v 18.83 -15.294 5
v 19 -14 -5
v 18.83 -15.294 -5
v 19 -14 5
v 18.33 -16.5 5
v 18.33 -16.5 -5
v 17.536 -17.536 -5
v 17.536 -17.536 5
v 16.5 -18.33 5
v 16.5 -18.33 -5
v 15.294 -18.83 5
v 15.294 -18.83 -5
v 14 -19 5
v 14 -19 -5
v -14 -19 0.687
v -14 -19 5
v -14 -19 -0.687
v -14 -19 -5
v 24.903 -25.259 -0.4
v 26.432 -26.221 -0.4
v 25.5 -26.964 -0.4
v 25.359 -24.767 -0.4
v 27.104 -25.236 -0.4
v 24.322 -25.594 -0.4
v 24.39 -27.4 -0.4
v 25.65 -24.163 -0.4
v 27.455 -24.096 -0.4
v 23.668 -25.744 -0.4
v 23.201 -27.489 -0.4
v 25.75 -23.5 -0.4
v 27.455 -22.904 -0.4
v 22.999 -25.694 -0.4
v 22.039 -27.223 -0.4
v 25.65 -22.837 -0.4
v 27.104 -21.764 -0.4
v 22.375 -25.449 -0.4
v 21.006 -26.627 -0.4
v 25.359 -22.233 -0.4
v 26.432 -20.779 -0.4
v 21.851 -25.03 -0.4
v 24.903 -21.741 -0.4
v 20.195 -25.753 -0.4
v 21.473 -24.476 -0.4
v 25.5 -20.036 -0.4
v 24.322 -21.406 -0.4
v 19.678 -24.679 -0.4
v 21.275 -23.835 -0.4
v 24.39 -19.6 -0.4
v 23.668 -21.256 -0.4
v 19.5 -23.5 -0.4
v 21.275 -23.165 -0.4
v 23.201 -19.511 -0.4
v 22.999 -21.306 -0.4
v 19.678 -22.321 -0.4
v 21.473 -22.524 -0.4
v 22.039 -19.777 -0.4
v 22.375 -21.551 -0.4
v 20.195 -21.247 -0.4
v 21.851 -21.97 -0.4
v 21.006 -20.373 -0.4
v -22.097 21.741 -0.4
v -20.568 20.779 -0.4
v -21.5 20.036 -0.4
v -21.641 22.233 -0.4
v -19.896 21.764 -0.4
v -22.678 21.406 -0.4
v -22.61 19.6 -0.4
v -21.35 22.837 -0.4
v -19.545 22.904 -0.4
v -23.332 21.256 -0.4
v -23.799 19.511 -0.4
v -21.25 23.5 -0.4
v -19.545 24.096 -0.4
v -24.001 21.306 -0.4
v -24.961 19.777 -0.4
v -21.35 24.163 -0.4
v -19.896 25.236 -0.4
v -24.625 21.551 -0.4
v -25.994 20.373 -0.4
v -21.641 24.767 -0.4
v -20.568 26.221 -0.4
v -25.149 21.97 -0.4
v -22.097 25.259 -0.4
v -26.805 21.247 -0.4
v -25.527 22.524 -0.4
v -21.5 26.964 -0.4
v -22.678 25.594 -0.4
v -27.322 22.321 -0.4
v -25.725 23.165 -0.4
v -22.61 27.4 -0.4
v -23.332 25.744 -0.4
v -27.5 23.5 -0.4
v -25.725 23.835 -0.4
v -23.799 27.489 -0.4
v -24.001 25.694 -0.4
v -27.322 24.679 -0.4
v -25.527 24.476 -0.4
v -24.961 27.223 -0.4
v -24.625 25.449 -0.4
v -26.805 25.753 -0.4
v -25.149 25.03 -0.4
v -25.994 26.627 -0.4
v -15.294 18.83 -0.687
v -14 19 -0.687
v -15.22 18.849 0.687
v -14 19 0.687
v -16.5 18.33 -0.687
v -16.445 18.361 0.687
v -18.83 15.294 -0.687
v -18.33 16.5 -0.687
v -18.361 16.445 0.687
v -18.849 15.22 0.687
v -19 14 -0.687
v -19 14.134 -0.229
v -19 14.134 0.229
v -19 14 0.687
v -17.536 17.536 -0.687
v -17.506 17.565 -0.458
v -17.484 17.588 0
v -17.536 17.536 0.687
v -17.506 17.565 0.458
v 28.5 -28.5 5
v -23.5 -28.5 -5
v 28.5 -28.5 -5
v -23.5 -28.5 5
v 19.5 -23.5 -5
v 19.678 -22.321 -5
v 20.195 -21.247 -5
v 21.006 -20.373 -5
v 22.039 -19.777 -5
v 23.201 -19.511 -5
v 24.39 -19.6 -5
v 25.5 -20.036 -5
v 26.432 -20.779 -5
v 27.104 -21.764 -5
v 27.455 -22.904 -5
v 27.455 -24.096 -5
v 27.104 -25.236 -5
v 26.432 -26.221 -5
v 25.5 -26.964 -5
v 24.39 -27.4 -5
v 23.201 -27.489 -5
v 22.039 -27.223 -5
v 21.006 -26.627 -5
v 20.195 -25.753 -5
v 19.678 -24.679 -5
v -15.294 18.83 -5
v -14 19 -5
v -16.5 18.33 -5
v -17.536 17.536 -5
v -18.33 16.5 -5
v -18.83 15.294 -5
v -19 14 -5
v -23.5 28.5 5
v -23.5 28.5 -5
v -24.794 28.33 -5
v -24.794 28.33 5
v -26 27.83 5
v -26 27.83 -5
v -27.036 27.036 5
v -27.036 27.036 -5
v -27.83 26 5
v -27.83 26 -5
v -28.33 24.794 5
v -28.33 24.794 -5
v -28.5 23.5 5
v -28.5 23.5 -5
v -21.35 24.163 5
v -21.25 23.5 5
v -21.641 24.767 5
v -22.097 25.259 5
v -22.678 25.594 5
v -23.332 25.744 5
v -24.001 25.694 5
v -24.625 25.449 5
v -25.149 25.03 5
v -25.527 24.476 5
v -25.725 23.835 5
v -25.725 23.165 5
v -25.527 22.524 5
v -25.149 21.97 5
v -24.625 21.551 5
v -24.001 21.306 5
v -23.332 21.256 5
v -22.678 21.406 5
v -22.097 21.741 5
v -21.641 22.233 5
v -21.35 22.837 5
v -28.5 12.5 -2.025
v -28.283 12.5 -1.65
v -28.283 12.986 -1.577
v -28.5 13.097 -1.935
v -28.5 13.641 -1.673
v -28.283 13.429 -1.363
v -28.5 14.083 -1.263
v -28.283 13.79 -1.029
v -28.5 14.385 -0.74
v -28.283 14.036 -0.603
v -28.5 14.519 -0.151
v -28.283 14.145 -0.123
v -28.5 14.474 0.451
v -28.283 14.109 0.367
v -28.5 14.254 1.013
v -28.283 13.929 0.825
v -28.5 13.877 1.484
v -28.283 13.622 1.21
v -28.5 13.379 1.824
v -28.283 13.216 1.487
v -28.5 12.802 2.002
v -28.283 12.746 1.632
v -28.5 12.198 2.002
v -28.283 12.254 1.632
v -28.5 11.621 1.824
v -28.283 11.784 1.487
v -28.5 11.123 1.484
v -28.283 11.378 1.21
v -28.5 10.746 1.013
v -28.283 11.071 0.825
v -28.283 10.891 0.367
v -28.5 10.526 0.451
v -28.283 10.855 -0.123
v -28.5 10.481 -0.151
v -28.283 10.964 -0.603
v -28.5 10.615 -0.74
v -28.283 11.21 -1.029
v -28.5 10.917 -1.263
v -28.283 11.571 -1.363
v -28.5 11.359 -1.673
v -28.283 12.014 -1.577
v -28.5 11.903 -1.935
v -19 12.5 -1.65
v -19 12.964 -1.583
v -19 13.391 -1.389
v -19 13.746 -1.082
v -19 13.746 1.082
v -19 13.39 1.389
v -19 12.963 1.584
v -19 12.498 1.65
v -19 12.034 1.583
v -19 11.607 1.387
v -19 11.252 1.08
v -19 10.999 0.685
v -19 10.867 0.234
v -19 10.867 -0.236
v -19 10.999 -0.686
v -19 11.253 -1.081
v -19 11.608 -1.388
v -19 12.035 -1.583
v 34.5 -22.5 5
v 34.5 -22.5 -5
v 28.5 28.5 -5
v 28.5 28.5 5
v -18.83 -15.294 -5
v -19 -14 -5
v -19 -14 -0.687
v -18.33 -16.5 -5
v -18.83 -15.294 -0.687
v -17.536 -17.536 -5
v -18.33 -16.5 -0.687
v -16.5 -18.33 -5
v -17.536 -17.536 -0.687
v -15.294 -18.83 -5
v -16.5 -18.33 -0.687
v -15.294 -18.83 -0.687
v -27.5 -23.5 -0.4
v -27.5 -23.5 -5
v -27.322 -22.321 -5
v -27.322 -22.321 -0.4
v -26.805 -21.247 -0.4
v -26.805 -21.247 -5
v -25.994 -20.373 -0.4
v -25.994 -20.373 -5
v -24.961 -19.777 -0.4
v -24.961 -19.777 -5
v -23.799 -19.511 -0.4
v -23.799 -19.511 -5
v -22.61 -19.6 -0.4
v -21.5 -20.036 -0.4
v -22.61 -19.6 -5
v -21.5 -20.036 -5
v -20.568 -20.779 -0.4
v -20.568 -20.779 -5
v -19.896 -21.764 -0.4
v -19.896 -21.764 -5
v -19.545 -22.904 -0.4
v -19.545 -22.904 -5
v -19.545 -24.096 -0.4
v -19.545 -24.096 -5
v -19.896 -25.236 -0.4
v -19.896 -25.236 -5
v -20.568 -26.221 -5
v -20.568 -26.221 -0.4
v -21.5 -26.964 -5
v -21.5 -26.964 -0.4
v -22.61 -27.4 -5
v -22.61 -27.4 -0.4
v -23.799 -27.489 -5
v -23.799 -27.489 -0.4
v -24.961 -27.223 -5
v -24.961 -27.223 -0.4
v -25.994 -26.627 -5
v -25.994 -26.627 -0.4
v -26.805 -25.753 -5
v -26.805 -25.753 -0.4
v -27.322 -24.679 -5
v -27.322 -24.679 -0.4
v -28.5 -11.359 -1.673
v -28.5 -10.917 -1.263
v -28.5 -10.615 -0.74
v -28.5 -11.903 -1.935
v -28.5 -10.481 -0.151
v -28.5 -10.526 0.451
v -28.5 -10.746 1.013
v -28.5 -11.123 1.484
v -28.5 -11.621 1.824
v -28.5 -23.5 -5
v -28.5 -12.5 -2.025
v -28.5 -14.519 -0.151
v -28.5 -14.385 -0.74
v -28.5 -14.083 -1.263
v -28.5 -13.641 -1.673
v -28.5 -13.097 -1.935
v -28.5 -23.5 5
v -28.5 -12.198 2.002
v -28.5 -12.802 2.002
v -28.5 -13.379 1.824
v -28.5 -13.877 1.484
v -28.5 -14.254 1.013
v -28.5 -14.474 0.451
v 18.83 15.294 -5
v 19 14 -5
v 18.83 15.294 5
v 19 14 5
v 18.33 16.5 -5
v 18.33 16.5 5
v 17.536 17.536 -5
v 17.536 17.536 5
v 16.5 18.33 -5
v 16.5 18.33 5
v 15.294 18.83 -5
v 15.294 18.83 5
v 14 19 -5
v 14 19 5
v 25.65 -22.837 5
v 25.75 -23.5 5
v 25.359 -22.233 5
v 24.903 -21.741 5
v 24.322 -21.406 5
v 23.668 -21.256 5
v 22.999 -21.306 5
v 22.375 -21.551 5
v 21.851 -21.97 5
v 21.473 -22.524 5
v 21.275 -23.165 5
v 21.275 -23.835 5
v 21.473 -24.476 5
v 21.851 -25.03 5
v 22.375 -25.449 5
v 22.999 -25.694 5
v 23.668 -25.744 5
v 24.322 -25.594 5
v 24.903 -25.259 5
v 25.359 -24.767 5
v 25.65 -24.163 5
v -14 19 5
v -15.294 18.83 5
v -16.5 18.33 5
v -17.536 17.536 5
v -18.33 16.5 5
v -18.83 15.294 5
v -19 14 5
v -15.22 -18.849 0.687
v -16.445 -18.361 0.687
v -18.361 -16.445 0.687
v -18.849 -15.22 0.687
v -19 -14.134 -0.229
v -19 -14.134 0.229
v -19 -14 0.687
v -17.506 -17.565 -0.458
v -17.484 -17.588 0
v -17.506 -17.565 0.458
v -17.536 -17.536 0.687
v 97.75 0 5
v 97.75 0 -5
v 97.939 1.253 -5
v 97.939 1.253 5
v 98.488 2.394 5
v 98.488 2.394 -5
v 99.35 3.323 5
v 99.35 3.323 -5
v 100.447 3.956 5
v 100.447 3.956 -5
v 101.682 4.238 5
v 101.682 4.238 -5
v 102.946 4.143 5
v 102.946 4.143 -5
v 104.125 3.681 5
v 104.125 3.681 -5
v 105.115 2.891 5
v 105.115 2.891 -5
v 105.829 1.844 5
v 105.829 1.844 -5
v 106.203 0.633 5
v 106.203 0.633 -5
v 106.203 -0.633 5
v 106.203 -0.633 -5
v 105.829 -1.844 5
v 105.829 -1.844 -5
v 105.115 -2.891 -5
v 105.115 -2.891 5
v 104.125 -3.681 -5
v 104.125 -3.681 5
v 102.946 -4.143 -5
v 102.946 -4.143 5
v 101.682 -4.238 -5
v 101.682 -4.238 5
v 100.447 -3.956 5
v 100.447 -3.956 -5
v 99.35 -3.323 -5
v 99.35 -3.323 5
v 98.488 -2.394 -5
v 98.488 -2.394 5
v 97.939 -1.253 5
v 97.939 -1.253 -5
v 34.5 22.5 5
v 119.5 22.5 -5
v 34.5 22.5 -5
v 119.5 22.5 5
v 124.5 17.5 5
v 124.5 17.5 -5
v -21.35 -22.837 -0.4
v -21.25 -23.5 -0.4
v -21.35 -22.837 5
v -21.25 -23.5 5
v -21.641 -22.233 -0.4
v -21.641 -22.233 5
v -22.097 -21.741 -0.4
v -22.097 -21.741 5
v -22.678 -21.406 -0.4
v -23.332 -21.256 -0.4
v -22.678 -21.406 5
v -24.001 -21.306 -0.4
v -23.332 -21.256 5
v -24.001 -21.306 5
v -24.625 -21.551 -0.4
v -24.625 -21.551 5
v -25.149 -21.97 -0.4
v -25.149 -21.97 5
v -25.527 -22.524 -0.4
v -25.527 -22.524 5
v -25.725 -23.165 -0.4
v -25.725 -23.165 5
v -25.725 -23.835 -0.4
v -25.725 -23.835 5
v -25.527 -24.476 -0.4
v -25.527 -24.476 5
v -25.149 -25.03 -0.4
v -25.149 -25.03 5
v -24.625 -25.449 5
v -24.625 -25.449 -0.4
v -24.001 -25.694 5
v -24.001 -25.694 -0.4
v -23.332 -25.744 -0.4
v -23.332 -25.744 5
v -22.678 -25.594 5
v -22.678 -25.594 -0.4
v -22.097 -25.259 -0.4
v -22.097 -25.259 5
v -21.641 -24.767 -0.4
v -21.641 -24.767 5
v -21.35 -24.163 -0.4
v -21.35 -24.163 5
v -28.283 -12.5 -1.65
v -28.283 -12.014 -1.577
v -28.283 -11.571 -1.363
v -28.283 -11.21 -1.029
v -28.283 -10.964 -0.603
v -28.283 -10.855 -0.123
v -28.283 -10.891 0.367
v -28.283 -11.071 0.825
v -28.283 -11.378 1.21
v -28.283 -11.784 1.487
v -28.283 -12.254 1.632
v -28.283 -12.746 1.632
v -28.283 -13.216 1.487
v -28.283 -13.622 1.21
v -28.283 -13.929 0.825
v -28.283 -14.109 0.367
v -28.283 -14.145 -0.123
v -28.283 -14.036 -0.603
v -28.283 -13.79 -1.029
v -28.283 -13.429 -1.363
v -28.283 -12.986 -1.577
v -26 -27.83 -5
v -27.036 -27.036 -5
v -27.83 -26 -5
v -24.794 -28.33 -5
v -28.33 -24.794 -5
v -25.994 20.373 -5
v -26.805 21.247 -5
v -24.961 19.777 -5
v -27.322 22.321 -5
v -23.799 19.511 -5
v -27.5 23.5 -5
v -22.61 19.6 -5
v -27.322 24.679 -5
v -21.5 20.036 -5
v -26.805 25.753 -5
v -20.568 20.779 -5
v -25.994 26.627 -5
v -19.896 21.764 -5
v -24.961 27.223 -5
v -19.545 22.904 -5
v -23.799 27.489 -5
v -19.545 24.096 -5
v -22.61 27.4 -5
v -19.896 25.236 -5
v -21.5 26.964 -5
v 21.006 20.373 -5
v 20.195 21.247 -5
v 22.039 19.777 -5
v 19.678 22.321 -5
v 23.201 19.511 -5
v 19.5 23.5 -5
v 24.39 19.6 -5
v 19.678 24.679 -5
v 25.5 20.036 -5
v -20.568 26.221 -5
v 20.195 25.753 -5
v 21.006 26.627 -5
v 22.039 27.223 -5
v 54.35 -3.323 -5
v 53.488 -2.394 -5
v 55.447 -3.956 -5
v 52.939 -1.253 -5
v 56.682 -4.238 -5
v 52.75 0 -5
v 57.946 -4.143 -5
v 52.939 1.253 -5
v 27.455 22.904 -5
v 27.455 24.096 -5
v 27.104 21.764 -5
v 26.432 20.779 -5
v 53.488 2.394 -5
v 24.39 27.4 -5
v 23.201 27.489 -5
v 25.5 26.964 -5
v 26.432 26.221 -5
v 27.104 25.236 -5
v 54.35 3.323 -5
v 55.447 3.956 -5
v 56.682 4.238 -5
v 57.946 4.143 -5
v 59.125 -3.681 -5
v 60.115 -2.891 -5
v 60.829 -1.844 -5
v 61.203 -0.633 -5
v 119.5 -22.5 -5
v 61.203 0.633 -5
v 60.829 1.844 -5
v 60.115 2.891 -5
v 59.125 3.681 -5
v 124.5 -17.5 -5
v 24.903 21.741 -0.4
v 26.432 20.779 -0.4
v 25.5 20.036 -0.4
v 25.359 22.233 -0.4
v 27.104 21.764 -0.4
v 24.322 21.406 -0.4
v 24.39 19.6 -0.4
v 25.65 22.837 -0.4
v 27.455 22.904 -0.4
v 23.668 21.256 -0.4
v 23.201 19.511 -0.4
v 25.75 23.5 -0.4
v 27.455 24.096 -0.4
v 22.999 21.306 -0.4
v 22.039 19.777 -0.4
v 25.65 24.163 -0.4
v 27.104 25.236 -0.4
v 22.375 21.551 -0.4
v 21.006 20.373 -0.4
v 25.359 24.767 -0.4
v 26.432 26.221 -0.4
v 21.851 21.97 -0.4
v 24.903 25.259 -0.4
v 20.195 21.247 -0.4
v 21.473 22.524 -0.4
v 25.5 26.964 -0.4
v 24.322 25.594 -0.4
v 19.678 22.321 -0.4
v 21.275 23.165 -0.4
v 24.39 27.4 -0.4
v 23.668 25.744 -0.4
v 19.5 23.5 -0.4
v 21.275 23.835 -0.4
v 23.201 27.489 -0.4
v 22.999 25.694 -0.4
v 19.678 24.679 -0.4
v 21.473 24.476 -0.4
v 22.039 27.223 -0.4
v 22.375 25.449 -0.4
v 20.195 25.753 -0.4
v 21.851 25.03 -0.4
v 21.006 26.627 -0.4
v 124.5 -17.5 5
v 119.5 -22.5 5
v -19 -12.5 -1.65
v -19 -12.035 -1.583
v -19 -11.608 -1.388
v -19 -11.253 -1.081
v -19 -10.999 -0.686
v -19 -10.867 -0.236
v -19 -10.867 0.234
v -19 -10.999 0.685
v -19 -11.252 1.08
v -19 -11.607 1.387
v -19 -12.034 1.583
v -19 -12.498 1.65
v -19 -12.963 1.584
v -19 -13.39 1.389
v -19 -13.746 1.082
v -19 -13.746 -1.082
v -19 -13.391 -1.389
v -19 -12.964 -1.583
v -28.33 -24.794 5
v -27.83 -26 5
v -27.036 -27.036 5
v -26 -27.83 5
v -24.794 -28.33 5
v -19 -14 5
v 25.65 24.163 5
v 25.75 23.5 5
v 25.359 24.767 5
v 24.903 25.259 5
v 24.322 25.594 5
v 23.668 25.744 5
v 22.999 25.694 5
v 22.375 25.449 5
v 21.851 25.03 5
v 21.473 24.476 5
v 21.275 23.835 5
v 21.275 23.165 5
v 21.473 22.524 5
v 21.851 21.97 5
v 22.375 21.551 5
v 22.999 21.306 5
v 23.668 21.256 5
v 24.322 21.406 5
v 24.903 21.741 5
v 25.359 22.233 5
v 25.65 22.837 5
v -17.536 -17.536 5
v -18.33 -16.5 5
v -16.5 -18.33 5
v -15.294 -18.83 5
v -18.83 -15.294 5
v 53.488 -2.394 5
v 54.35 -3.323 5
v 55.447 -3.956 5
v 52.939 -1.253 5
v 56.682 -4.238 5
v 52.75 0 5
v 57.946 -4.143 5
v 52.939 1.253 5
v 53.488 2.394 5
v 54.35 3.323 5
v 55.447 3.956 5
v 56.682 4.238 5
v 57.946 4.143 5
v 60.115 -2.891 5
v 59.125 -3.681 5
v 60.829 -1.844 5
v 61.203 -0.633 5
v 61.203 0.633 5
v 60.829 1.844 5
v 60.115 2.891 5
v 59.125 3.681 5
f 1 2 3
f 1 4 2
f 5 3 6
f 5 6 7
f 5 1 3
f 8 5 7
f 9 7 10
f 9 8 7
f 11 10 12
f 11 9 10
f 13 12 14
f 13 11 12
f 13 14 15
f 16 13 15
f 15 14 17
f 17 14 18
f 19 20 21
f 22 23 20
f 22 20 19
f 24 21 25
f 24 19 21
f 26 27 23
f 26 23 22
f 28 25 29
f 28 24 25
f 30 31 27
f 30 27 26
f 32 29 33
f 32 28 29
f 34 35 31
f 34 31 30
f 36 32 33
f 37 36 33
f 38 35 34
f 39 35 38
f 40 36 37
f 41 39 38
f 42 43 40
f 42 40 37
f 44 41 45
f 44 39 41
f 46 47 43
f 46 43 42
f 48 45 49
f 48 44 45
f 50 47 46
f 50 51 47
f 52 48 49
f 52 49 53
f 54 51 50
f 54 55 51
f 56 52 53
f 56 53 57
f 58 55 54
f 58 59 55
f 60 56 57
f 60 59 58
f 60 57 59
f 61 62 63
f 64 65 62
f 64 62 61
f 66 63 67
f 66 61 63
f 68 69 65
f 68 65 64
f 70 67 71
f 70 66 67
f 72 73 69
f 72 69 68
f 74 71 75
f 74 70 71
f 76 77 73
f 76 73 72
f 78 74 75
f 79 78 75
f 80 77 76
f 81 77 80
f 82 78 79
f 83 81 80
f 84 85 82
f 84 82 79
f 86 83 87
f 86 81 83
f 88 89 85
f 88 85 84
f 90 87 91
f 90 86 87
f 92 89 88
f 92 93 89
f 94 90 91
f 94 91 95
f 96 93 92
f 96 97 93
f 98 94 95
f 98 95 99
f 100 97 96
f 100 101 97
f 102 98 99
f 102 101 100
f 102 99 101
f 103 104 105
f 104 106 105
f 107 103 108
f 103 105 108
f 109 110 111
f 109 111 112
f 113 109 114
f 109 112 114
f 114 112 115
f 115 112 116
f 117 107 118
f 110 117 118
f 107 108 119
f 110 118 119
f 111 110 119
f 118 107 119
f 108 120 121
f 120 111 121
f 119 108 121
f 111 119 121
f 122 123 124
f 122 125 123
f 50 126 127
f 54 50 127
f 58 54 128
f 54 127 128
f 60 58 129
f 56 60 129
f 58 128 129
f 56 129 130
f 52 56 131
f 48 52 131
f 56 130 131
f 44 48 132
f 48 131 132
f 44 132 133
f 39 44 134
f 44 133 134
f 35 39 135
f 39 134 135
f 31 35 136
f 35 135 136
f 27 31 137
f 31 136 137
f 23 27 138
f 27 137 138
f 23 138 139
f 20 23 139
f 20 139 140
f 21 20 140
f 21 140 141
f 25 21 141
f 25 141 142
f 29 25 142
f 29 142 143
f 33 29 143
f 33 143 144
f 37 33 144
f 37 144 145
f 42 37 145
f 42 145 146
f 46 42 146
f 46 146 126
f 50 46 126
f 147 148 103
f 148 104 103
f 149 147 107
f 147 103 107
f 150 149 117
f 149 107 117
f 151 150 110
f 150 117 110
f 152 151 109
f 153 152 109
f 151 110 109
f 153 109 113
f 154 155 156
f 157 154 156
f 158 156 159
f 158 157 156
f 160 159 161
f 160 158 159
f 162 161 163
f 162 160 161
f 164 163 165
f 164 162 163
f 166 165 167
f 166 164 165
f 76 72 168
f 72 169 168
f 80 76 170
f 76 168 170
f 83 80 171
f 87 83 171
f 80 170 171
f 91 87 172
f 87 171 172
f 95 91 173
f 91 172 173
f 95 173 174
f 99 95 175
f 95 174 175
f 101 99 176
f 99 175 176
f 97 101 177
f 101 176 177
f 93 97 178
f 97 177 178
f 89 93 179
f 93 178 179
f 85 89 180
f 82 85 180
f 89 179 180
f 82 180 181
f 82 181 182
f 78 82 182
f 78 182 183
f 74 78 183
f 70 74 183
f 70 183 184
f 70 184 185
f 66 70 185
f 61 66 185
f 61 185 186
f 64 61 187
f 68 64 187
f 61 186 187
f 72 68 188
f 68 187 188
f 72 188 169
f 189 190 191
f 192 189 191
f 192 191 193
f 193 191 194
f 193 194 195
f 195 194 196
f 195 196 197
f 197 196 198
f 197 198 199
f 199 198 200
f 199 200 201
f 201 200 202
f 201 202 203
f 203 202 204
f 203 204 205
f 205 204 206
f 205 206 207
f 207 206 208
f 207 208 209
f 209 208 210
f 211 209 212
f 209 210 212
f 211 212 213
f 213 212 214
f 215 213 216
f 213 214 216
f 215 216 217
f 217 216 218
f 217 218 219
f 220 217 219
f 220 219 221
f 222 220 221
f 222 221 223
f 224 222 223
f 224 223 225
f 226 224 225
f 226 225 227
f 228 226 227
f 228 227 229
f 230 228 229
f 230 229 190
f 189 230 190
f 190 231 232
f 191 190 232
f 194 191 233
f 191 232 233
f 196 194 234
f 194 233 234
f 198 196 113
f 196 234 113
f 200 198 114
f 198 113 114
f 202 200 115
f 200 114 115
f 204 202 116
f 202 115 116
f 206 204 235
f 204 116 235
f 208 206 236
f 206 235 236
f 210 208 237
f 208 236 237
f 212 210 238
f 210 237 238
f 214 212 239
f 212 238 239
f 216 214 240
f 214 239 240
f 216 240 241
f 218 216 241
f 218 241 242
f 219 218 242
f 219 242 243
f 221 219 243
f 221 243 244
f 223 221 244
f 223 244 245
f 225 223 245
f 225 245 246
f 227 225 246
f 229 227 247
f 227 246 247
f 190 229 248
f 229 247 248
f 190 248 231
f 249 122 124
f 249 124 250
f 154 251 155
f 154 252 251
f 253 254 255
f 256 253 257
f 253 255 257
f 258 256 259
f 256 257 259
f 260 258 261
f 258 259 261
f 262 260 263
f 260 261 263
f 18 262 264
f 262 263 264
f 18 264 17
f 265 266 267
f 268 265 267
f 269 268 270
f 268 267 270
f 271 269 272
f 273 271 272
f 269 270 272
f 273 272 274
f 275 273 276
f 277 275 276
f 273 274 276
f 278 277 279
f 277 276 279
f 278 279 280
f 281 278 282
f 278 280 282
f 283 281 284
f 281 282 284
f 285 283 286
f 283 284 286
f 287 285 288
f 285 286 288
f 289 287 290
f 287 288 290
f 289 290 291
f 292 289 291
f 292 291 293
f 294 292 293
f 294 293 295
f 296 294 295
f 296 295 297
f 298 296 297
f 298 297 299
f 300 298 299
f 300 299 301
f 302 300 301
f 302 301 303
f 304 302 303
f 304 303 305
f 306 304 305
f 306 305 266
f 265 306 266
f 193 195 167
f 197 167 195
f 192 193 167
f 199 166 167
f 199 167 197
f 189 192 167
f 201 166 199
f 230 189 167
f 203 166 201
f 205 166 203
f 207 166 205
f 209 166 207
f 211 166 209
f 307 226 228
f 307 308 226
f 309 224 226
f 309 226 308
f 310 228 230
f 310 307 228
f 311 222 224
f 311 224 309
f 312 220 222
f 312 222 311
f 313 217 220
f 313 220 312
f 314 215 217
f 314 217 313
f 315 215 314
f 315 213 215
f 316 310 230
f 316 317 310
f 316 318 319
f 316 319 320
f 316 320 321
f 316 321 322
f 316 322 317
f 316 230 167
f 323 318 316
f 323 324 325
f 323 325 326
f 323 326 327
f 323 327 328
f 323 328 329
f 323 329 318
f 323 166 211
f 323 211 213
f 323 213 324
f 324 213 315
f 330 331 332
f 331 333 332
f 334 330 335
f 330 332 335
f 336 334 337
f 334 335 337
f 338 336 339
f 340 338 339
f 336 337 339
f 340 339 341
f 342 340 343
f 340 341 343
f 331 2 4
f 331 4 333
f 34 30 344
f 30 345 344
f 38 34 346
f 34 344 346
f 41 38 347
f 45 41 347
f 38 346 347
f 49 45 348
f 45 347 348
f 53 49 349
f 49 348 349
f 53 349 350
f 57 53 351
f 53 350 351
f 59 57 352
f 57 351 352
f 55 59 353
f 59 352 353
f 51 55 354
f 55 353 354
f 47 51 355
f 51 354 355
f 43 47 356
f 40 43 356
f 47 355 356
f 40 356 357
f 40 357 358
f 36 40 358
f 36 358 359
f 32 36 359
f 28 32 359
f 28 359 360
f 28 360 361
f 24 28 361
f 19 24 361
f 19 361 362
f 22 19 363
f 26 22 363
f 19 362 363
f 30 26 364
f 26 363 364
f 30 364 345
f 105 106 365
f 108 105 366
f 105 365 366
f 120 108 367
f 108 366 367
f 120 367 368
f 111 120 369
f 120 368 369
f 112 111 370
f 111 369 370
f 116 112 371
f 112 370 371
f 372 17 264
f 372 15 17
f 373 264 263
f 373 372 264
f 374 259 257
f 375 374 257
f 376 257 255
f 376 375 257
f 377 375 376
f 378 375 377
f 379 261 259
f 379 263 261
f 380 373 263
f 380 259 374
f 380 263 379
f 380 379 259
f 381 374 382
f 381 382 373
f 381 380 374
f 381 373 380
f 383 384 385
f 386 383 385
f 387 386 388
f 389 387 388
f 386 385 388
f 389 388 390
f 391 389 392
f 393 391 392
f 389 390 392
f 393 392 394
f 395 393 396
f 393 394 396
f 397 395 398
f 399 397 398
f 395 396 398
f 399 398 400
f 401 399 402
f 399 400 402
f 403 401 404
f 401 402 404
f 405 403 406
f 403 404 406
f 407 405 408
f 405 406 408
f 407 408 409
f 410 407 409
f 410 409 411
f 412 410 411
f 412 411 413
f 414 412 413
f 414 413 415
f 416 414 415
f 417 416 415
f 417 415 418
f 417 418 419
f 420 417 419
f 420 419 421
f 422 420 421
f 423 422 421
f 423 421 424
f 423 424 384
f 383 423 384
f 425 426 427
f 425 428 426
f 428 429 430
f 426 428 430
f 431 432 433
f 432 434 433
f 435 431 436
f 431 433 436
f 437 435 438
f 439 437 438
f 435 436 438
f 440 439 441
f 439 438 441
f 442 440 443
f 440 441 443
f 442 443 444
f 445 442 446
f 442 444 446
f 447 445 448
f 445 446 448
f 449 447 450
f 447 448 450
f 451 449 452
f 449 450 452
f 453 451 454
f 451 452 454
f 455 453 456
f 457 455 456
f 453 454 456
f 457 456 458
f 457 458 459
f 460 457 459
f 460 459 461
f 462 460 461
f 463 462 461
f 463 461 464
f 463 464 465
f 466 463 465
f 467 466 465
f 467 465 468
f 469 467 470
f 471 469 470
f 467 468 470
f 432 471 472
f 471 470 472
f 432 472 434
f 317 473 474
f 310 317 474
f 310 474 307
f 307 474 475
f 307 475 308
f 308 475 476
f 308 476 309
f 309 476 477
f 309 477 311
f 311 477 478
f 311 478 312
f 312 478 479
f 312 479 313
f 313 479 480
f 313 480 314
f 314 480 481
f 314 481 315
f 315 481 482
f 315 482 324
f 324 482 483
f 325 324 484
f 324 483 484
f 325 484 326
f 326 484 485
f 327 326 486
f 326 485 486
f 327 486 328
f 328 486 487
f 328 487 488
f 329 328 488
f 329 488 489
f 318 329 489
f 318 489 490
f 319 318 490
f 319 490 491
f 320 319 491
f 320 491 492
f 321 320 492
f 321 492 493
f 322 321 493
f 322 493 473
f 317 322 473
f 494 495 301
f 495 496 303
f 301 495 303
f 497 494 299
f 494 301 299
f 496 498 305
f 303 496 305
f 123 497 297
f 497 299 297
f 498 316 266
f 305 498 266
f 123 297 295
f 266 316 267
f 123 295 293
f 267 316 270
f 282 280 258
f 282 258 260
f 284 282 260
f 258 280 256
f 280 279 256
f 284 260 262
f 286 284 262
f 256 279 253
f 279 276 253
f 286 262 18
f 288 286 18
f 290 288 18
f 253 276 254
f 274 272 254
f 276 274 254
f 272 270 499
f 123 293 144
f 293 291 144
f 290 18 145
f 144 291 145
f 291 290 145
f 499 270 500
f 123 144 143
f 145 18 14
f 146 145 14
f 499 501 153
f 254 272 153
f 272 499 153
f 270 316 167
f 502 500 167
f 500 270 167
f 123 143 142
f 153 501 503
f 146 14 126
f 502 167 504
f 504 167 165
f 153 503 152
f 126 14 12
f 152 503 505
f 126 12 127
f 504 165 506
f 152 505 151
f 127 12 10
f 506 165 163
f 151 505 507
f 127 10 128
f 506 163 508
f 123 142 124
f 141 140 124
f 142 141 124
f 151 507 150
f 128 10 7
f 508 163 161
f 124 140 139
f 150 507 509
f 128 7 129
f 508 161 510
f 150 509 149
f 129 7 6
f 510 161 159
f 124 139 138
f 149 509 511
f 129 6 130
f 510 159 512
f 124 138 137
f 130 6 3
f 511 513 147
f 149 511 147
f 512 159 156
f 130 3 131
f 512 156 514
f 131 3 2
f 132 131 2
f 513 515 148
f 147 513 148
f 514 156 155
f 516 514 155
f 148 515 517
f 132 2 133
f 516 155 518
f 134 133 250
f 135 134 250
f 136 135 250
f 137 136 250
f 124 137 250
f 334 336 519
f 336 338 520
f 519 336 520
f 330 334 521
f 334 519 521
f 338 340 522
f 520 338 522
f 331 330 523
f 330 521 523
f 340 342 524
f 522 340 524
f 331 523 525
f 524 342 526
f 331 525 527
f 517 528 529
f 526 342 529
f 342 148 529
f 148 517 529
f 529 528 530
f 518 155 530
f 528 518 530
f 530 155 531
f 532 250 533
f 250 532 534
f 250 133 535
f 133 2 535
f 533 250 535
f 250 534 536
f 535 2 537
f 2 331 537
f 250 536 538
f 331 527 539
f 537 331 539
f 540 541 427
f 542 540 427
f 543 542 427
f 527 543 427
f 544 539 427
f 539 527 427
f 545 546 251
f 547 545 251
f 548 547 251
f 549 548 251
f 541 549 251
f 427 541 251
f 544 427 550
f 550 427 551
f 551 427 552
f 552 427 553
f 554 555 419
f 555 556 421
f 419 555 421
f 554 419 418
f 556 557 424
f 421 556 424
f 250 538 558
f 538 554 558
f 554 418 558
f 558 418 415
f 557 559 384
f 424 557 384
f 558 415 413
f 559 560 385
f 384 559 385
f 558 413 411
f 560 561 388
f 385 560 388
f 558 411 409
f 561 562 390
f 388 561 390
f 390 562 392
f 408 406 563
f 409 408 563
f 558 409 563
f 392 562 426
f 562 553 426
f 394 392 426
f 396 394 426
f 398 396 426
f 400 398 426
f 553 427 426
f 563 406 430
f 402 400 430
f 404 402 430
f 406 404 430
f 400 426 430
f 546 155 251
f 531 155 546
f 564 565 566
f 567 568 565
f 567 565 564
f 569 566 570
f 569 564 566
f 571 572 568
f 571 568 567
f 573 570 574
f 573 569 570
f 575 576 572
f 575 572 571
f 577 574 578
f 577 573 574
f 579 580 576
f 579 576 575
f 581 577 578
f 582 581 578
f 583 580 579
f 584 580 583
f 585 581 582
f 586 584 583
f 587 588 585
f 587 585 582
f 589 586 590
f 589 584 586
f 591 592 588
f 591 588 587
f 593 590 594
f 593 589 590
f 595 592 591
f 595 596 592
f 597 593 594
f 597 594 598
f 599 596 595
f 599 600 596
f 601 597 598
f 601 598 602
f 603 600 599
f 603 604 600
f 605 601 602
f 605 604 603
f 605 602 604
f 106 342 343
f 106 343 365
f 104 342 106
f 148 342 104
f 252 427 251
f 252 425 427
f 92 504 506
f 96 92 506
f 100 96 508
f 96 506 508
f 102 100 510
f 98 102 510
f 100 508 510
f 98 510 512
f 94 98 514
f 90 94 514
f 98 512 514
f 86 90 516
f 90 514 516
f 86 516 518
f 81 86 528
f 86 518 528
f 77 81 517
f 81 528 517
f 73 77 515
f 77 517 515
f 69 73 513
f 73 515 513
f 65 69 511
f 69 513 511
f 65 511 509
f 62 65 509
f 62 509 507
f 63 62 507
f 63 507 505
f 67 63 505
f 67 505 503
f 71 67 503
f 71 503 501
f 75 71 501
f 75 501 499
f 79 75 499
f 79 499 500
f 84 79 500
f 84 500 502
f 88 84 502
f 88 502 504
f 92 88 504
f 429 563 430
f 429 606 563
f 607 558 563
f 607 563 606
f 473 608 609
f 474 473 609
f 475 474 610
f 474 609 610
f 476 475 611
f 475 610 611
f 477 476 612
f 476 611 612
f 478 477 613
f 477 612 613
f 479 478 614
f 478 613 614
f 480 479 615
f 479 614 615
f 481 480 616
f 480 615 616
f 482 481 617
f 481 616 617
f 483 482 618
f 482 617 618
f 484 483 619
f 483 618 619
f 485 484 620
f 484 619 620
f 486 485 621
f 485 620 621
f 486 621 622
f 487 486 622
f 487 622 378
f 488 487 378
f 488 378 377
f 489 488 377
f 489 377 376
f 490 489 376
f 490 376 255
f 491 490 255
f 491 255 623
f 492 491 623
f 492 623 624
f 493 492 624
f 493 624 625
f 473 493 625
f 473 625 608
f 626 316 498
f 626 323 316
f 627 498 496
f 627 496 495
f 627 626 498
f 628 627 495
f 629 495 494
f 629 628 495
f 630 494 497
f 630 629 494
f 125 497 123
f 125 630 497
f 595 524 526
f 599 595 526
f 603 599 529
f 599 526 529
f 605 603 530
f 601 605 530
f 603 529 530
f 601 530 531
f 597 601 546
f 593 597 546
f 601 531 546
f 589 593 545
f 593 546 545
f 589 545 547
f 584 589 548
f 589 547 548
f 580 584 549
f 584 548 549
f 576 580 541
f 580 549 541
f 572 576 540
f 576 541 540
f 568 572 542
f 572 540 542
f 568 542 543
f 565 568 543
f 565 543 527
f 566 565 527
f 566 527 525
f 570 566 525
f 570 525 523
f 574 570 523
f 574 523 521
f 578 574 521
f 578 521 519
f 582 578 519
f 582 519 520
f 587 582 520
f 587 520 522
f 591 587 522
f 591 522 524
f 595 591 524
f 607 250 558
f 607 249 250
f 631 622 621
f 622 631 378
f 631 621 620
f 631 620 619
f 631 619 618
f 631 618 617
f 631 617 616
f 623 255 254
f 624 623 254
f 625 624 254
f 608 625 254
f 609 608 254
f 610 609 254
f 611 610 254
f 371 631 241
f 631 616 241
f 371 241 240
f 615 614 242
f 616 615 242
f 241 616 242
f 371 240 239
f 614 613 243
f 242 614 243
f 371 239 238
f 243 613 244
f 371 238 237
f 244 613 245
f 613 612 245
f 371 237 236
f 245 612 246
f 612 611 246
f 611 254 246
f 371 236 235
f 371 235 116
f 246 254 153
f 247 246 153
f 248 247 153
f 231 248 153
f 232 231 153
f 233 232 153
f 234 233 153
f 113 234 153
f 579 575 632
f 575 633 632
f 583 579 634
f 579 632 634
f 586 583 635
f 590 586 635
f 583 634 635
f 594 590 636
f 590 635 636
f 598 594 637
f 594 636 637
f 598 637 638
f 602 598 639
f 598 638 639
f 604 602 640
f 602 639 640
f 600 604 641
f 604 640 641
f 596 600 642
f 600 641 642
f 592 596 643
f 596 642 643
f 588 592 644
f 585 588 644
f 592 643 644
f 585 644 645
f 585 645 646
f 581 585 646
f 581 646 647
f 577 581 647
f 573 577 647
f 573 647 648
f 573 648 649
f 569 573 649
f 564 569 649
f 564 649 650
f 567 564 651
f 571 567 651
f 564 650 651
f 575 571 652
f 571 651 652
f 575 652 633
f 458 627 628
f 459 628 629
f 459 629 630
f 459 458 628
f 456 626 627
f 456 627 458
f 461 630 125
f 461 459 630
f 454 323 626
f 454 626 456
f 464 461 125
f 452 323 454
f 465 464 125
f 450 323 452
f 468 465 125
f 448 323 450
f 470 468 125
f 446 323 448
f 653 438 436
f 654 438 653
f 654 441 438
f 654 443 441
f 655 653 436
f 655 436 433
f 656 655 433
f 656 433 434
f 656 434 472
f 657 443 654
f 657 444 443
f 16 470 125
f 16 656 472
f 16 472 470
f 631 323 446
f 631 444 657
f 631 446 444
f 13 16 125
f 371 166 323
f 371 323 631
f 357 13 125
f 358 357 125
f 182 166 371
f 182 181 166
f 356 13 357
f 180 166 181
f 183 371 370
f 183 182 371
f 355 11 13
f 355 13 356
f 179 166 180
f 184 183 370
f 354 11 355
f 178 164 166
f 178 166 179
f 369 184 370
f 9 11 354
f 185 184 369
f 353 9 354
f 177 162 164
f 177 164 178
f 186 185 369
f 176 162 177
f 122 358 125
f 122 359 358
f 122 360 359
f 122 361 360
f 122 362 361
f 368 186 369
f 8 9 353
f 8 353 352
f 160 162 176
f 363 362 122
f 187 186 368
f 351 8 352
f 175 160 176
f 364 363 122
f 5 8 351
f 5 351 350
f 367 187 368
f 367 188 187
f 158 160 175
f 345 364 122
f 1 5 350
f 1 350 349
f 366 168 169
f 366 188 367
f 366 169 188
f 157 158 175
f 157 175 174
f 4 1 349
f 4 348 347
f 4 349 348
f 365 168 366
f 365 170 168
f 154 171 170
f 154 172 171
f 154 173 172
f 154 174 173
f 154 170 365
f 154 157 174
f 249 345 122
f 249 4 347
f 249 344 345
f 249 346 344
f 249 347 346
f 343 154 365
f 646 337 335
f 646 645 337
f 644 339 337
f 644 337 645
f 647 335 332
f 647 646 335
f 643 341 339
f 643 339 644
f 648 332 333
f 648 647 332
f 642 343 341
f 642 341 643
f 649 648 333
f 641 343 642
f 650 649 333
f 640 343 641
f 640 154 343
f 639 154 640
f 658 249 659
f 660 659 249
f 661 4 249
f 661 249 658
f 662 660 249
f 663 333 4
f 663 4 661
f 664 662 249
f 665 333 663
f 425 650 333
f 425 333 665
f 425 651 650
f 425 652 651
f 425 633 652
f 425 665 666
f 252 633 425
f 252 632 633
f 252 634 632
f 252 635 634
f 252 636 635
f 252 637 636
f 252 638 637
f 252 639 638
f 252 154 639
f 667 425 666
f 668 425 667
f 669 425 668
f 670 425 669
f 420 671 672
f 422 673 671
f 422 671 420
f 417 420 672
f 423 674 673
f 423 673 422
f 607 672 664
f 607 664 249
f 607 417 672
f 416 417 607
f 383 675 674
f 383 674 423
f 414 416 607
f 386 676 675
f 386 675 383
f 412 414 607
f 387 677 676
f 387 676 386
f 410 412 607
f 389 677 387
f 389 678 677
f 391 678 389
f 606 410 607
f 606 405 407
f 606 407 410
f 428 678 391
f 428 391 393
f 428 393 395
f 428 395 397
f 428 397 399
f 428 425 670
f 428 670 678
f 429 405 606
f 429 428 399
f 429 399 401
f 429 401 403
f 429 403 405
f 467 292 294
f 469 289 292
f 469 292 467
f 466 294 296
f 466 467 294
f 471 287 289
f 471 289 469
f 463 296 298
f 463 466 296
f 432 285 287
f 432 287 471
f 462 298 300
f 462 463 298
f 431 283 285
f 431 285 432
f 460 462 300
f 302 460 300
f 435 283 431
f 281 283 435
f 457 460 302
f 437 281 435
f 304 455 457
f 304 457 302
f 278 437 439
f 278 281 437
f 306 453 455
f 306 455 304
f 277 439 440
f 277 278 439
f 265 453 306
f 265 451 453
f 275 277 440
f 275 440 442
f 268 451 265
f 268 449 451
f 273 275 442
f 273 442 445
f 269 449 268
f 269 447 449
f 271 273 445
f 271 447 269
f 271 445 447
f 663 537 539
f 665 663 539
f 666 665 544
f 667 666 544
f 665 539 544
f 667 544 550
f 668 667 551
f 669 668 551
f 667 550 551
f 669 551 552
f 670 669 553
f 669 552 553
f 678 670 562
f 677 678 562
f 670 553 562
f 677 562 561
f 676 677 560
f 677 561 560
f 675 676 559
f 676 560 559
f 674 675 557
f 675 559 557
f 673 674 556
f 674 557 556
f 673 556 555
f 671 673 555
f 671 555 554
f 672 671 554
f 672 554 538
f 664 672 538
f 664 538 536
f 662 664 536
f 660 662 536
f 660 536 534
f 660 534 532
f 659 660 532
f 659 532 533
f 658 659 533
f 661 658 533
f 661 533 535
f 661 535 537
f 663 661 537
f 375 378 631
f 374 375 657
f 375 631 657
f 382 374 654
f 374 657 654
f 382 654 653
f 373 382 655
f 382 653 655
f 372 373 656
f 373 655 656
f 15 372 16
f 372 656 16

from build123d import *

# Parameters (mm, degrees)
EXTRUDE_1_DEPTH              = 5
SKETCH_6_R                   = 10
CUT_EXTRUDE_1530_DEPTH       = 10
SKETCH_19_R                  = 12
CUT_EXTRUDE_1946_DEPTH       = 5
HOLE_WIZARD_8_5_8_5_1_D      = 8.5
HOLE_WIZARD_1_D              = 4.5
HOLE_WIZARD_1_CBORE_D        = 8
HOLE_WIZARD_1_CBORE_DEPTH    = 4.6
FILLET_1_R                   = 5
CHAMFER_1_SIZE               = 5
CHAMFER_2_SIZE               = 0.2
HOLE_WIZARD_M4_1_D           = 3.3
HOLE_WIZARD_M4_1_DEPTH       = 15.5
HOLE_WIZARD_M4_1_CSINK_D     = 4.05
HOLE_WIZARD_M4_1_CSINK_ANGLE = 120
SKETCH_22_W                  = 38
SKETCH_22_H                  = 38
CUT_EXTRUDE_1_DEPTH          = 10
FILLET_2_R                   = 5


with BuildPart() as part:
    # 草图1 → 凸台-拉伸1 (new body, symmetric)
    with BuildSketch(Plane.XY):
        Polygon((28.5, 28.5), (-28.5, 28.5), (-28.5, -28.5), (28.5, -28.5), (34.5, -22.5), (124.5, -22.5), (124.5, 22.5), (34.5, 22.5), align=None)
    extrude(amount=EXTRUDE_1_DEPTH, both=True)

    # 草图6 → Cut-Extrude 1530 (cut)
    with BuildSketch(Plane.XY.offset(5)):
        Circle(SKETCH_6_R)
    extrude(amount=-CUT_EXTRUDE_1530_DEPTH, mode=Mode.SUBTRACT)

    # 草图19 → Cut-Extrude 1946 (cut)
    with BuildSketch(Plane(origin=(0, 0, -5), x_dir=(-1, 0, 0), z_dir=(0, 0, -1))):
        Circle(SKETCH_19_R)
    extrude(amount=-CUT_EXTRUDE_1946_DEPTH, mode=Mode.SUBTRACT)

    # Ø8.5 (8.5) 直径孔1 (through all)
    with Locations(Plane.XY.offset(5)):
        with Locations((57, 0), (102, 0)):
            Hole(HOLE_WIZARD_8_5_8_5_1_D / 2)

    # 打孔尺寸(%根据)内六角圆柱头螺钉的类型1 (through all)
    with Locations(Plane(origin=(0, 0, -5), x_dir=(-1, 0, 0), z_dir=(0, 0, -1))):
        with Locations((-23.5, 23.5), (23.5, 23.5), (23.5, -23.5), (-23.5, -23.5)):
            CounterBoreHole(HOLE_WIZARD_1_D / 2, HOLE_WIZARD_1_CBORE_D / 2, HOLE_WIZARD_1_CBORE_DEPTH)

    # 圆角1
    fillet_1_edges = [part.edges().sort_by_distance(p)[0] for p in [
        (-28.5, -28.5, 0),
        (-28.5, 28.5, 0),
    ]]
    fillet(fillet_1_edges, radius=FILLET_1_R)

    # 倒角1
    chamfer_1_edges = [part.edges().sort_by_distance(p)[0] for p in [
        (124.5, 22.5, 0),
        (124.5, -22.5, 0),
    ]]
    chamfer(chamfer_1_edges, length=CHAMFER_1_SIZE)

    # 倒角2
    chamfer_2_edges = [part.edges().sort_by_distance(p)[0] for p in [
        (12, 0, -5),
    ]]
    chamfer(chamfer_2_edges, length=CHAMFER_2_SIZE)

    # M4 螺纹孔1
    with Locations(Plane.ZY.offset(28.5)):
        with Locations((0, 12.5), (0, -12.5)):
            CounterSinkHole(HOLE_WIZARD_M4_1_D / 2, HOLE_WIZARD_M4_1_CSINK_D / 2, depth=HOLE_WIZARD_M4_1_DEPTH, counter_sink_angle=HOLE_WIZARD_M4_1_CSINK_ANGLE)

    # 草图22 → 切除-拉伸1 (cut)
    with BuildSketch(Plane(origin=(0, 0, -5), x_dir=(-1, 0, 0), z_dir=(0, 0, -1))):
        Rectangle(SKETCH_22_W, SKETCH_22_H)
    extrude(amount=-CUT_EXTRUDE_1_DEPTH, mode=Mode.SUBTRACT)

    # 圆角2
    fillet_2_edges = [part.edges().sort_by_distance(p)[0] for p in [
        (-19, 19, 0),
        (-19, -19, 0),
        (19, -19, 0),
        (19, 19, 0),
    ]]
    fillet(fillet_2_edges, radius=FILLET_2_R)


solid = part.part
